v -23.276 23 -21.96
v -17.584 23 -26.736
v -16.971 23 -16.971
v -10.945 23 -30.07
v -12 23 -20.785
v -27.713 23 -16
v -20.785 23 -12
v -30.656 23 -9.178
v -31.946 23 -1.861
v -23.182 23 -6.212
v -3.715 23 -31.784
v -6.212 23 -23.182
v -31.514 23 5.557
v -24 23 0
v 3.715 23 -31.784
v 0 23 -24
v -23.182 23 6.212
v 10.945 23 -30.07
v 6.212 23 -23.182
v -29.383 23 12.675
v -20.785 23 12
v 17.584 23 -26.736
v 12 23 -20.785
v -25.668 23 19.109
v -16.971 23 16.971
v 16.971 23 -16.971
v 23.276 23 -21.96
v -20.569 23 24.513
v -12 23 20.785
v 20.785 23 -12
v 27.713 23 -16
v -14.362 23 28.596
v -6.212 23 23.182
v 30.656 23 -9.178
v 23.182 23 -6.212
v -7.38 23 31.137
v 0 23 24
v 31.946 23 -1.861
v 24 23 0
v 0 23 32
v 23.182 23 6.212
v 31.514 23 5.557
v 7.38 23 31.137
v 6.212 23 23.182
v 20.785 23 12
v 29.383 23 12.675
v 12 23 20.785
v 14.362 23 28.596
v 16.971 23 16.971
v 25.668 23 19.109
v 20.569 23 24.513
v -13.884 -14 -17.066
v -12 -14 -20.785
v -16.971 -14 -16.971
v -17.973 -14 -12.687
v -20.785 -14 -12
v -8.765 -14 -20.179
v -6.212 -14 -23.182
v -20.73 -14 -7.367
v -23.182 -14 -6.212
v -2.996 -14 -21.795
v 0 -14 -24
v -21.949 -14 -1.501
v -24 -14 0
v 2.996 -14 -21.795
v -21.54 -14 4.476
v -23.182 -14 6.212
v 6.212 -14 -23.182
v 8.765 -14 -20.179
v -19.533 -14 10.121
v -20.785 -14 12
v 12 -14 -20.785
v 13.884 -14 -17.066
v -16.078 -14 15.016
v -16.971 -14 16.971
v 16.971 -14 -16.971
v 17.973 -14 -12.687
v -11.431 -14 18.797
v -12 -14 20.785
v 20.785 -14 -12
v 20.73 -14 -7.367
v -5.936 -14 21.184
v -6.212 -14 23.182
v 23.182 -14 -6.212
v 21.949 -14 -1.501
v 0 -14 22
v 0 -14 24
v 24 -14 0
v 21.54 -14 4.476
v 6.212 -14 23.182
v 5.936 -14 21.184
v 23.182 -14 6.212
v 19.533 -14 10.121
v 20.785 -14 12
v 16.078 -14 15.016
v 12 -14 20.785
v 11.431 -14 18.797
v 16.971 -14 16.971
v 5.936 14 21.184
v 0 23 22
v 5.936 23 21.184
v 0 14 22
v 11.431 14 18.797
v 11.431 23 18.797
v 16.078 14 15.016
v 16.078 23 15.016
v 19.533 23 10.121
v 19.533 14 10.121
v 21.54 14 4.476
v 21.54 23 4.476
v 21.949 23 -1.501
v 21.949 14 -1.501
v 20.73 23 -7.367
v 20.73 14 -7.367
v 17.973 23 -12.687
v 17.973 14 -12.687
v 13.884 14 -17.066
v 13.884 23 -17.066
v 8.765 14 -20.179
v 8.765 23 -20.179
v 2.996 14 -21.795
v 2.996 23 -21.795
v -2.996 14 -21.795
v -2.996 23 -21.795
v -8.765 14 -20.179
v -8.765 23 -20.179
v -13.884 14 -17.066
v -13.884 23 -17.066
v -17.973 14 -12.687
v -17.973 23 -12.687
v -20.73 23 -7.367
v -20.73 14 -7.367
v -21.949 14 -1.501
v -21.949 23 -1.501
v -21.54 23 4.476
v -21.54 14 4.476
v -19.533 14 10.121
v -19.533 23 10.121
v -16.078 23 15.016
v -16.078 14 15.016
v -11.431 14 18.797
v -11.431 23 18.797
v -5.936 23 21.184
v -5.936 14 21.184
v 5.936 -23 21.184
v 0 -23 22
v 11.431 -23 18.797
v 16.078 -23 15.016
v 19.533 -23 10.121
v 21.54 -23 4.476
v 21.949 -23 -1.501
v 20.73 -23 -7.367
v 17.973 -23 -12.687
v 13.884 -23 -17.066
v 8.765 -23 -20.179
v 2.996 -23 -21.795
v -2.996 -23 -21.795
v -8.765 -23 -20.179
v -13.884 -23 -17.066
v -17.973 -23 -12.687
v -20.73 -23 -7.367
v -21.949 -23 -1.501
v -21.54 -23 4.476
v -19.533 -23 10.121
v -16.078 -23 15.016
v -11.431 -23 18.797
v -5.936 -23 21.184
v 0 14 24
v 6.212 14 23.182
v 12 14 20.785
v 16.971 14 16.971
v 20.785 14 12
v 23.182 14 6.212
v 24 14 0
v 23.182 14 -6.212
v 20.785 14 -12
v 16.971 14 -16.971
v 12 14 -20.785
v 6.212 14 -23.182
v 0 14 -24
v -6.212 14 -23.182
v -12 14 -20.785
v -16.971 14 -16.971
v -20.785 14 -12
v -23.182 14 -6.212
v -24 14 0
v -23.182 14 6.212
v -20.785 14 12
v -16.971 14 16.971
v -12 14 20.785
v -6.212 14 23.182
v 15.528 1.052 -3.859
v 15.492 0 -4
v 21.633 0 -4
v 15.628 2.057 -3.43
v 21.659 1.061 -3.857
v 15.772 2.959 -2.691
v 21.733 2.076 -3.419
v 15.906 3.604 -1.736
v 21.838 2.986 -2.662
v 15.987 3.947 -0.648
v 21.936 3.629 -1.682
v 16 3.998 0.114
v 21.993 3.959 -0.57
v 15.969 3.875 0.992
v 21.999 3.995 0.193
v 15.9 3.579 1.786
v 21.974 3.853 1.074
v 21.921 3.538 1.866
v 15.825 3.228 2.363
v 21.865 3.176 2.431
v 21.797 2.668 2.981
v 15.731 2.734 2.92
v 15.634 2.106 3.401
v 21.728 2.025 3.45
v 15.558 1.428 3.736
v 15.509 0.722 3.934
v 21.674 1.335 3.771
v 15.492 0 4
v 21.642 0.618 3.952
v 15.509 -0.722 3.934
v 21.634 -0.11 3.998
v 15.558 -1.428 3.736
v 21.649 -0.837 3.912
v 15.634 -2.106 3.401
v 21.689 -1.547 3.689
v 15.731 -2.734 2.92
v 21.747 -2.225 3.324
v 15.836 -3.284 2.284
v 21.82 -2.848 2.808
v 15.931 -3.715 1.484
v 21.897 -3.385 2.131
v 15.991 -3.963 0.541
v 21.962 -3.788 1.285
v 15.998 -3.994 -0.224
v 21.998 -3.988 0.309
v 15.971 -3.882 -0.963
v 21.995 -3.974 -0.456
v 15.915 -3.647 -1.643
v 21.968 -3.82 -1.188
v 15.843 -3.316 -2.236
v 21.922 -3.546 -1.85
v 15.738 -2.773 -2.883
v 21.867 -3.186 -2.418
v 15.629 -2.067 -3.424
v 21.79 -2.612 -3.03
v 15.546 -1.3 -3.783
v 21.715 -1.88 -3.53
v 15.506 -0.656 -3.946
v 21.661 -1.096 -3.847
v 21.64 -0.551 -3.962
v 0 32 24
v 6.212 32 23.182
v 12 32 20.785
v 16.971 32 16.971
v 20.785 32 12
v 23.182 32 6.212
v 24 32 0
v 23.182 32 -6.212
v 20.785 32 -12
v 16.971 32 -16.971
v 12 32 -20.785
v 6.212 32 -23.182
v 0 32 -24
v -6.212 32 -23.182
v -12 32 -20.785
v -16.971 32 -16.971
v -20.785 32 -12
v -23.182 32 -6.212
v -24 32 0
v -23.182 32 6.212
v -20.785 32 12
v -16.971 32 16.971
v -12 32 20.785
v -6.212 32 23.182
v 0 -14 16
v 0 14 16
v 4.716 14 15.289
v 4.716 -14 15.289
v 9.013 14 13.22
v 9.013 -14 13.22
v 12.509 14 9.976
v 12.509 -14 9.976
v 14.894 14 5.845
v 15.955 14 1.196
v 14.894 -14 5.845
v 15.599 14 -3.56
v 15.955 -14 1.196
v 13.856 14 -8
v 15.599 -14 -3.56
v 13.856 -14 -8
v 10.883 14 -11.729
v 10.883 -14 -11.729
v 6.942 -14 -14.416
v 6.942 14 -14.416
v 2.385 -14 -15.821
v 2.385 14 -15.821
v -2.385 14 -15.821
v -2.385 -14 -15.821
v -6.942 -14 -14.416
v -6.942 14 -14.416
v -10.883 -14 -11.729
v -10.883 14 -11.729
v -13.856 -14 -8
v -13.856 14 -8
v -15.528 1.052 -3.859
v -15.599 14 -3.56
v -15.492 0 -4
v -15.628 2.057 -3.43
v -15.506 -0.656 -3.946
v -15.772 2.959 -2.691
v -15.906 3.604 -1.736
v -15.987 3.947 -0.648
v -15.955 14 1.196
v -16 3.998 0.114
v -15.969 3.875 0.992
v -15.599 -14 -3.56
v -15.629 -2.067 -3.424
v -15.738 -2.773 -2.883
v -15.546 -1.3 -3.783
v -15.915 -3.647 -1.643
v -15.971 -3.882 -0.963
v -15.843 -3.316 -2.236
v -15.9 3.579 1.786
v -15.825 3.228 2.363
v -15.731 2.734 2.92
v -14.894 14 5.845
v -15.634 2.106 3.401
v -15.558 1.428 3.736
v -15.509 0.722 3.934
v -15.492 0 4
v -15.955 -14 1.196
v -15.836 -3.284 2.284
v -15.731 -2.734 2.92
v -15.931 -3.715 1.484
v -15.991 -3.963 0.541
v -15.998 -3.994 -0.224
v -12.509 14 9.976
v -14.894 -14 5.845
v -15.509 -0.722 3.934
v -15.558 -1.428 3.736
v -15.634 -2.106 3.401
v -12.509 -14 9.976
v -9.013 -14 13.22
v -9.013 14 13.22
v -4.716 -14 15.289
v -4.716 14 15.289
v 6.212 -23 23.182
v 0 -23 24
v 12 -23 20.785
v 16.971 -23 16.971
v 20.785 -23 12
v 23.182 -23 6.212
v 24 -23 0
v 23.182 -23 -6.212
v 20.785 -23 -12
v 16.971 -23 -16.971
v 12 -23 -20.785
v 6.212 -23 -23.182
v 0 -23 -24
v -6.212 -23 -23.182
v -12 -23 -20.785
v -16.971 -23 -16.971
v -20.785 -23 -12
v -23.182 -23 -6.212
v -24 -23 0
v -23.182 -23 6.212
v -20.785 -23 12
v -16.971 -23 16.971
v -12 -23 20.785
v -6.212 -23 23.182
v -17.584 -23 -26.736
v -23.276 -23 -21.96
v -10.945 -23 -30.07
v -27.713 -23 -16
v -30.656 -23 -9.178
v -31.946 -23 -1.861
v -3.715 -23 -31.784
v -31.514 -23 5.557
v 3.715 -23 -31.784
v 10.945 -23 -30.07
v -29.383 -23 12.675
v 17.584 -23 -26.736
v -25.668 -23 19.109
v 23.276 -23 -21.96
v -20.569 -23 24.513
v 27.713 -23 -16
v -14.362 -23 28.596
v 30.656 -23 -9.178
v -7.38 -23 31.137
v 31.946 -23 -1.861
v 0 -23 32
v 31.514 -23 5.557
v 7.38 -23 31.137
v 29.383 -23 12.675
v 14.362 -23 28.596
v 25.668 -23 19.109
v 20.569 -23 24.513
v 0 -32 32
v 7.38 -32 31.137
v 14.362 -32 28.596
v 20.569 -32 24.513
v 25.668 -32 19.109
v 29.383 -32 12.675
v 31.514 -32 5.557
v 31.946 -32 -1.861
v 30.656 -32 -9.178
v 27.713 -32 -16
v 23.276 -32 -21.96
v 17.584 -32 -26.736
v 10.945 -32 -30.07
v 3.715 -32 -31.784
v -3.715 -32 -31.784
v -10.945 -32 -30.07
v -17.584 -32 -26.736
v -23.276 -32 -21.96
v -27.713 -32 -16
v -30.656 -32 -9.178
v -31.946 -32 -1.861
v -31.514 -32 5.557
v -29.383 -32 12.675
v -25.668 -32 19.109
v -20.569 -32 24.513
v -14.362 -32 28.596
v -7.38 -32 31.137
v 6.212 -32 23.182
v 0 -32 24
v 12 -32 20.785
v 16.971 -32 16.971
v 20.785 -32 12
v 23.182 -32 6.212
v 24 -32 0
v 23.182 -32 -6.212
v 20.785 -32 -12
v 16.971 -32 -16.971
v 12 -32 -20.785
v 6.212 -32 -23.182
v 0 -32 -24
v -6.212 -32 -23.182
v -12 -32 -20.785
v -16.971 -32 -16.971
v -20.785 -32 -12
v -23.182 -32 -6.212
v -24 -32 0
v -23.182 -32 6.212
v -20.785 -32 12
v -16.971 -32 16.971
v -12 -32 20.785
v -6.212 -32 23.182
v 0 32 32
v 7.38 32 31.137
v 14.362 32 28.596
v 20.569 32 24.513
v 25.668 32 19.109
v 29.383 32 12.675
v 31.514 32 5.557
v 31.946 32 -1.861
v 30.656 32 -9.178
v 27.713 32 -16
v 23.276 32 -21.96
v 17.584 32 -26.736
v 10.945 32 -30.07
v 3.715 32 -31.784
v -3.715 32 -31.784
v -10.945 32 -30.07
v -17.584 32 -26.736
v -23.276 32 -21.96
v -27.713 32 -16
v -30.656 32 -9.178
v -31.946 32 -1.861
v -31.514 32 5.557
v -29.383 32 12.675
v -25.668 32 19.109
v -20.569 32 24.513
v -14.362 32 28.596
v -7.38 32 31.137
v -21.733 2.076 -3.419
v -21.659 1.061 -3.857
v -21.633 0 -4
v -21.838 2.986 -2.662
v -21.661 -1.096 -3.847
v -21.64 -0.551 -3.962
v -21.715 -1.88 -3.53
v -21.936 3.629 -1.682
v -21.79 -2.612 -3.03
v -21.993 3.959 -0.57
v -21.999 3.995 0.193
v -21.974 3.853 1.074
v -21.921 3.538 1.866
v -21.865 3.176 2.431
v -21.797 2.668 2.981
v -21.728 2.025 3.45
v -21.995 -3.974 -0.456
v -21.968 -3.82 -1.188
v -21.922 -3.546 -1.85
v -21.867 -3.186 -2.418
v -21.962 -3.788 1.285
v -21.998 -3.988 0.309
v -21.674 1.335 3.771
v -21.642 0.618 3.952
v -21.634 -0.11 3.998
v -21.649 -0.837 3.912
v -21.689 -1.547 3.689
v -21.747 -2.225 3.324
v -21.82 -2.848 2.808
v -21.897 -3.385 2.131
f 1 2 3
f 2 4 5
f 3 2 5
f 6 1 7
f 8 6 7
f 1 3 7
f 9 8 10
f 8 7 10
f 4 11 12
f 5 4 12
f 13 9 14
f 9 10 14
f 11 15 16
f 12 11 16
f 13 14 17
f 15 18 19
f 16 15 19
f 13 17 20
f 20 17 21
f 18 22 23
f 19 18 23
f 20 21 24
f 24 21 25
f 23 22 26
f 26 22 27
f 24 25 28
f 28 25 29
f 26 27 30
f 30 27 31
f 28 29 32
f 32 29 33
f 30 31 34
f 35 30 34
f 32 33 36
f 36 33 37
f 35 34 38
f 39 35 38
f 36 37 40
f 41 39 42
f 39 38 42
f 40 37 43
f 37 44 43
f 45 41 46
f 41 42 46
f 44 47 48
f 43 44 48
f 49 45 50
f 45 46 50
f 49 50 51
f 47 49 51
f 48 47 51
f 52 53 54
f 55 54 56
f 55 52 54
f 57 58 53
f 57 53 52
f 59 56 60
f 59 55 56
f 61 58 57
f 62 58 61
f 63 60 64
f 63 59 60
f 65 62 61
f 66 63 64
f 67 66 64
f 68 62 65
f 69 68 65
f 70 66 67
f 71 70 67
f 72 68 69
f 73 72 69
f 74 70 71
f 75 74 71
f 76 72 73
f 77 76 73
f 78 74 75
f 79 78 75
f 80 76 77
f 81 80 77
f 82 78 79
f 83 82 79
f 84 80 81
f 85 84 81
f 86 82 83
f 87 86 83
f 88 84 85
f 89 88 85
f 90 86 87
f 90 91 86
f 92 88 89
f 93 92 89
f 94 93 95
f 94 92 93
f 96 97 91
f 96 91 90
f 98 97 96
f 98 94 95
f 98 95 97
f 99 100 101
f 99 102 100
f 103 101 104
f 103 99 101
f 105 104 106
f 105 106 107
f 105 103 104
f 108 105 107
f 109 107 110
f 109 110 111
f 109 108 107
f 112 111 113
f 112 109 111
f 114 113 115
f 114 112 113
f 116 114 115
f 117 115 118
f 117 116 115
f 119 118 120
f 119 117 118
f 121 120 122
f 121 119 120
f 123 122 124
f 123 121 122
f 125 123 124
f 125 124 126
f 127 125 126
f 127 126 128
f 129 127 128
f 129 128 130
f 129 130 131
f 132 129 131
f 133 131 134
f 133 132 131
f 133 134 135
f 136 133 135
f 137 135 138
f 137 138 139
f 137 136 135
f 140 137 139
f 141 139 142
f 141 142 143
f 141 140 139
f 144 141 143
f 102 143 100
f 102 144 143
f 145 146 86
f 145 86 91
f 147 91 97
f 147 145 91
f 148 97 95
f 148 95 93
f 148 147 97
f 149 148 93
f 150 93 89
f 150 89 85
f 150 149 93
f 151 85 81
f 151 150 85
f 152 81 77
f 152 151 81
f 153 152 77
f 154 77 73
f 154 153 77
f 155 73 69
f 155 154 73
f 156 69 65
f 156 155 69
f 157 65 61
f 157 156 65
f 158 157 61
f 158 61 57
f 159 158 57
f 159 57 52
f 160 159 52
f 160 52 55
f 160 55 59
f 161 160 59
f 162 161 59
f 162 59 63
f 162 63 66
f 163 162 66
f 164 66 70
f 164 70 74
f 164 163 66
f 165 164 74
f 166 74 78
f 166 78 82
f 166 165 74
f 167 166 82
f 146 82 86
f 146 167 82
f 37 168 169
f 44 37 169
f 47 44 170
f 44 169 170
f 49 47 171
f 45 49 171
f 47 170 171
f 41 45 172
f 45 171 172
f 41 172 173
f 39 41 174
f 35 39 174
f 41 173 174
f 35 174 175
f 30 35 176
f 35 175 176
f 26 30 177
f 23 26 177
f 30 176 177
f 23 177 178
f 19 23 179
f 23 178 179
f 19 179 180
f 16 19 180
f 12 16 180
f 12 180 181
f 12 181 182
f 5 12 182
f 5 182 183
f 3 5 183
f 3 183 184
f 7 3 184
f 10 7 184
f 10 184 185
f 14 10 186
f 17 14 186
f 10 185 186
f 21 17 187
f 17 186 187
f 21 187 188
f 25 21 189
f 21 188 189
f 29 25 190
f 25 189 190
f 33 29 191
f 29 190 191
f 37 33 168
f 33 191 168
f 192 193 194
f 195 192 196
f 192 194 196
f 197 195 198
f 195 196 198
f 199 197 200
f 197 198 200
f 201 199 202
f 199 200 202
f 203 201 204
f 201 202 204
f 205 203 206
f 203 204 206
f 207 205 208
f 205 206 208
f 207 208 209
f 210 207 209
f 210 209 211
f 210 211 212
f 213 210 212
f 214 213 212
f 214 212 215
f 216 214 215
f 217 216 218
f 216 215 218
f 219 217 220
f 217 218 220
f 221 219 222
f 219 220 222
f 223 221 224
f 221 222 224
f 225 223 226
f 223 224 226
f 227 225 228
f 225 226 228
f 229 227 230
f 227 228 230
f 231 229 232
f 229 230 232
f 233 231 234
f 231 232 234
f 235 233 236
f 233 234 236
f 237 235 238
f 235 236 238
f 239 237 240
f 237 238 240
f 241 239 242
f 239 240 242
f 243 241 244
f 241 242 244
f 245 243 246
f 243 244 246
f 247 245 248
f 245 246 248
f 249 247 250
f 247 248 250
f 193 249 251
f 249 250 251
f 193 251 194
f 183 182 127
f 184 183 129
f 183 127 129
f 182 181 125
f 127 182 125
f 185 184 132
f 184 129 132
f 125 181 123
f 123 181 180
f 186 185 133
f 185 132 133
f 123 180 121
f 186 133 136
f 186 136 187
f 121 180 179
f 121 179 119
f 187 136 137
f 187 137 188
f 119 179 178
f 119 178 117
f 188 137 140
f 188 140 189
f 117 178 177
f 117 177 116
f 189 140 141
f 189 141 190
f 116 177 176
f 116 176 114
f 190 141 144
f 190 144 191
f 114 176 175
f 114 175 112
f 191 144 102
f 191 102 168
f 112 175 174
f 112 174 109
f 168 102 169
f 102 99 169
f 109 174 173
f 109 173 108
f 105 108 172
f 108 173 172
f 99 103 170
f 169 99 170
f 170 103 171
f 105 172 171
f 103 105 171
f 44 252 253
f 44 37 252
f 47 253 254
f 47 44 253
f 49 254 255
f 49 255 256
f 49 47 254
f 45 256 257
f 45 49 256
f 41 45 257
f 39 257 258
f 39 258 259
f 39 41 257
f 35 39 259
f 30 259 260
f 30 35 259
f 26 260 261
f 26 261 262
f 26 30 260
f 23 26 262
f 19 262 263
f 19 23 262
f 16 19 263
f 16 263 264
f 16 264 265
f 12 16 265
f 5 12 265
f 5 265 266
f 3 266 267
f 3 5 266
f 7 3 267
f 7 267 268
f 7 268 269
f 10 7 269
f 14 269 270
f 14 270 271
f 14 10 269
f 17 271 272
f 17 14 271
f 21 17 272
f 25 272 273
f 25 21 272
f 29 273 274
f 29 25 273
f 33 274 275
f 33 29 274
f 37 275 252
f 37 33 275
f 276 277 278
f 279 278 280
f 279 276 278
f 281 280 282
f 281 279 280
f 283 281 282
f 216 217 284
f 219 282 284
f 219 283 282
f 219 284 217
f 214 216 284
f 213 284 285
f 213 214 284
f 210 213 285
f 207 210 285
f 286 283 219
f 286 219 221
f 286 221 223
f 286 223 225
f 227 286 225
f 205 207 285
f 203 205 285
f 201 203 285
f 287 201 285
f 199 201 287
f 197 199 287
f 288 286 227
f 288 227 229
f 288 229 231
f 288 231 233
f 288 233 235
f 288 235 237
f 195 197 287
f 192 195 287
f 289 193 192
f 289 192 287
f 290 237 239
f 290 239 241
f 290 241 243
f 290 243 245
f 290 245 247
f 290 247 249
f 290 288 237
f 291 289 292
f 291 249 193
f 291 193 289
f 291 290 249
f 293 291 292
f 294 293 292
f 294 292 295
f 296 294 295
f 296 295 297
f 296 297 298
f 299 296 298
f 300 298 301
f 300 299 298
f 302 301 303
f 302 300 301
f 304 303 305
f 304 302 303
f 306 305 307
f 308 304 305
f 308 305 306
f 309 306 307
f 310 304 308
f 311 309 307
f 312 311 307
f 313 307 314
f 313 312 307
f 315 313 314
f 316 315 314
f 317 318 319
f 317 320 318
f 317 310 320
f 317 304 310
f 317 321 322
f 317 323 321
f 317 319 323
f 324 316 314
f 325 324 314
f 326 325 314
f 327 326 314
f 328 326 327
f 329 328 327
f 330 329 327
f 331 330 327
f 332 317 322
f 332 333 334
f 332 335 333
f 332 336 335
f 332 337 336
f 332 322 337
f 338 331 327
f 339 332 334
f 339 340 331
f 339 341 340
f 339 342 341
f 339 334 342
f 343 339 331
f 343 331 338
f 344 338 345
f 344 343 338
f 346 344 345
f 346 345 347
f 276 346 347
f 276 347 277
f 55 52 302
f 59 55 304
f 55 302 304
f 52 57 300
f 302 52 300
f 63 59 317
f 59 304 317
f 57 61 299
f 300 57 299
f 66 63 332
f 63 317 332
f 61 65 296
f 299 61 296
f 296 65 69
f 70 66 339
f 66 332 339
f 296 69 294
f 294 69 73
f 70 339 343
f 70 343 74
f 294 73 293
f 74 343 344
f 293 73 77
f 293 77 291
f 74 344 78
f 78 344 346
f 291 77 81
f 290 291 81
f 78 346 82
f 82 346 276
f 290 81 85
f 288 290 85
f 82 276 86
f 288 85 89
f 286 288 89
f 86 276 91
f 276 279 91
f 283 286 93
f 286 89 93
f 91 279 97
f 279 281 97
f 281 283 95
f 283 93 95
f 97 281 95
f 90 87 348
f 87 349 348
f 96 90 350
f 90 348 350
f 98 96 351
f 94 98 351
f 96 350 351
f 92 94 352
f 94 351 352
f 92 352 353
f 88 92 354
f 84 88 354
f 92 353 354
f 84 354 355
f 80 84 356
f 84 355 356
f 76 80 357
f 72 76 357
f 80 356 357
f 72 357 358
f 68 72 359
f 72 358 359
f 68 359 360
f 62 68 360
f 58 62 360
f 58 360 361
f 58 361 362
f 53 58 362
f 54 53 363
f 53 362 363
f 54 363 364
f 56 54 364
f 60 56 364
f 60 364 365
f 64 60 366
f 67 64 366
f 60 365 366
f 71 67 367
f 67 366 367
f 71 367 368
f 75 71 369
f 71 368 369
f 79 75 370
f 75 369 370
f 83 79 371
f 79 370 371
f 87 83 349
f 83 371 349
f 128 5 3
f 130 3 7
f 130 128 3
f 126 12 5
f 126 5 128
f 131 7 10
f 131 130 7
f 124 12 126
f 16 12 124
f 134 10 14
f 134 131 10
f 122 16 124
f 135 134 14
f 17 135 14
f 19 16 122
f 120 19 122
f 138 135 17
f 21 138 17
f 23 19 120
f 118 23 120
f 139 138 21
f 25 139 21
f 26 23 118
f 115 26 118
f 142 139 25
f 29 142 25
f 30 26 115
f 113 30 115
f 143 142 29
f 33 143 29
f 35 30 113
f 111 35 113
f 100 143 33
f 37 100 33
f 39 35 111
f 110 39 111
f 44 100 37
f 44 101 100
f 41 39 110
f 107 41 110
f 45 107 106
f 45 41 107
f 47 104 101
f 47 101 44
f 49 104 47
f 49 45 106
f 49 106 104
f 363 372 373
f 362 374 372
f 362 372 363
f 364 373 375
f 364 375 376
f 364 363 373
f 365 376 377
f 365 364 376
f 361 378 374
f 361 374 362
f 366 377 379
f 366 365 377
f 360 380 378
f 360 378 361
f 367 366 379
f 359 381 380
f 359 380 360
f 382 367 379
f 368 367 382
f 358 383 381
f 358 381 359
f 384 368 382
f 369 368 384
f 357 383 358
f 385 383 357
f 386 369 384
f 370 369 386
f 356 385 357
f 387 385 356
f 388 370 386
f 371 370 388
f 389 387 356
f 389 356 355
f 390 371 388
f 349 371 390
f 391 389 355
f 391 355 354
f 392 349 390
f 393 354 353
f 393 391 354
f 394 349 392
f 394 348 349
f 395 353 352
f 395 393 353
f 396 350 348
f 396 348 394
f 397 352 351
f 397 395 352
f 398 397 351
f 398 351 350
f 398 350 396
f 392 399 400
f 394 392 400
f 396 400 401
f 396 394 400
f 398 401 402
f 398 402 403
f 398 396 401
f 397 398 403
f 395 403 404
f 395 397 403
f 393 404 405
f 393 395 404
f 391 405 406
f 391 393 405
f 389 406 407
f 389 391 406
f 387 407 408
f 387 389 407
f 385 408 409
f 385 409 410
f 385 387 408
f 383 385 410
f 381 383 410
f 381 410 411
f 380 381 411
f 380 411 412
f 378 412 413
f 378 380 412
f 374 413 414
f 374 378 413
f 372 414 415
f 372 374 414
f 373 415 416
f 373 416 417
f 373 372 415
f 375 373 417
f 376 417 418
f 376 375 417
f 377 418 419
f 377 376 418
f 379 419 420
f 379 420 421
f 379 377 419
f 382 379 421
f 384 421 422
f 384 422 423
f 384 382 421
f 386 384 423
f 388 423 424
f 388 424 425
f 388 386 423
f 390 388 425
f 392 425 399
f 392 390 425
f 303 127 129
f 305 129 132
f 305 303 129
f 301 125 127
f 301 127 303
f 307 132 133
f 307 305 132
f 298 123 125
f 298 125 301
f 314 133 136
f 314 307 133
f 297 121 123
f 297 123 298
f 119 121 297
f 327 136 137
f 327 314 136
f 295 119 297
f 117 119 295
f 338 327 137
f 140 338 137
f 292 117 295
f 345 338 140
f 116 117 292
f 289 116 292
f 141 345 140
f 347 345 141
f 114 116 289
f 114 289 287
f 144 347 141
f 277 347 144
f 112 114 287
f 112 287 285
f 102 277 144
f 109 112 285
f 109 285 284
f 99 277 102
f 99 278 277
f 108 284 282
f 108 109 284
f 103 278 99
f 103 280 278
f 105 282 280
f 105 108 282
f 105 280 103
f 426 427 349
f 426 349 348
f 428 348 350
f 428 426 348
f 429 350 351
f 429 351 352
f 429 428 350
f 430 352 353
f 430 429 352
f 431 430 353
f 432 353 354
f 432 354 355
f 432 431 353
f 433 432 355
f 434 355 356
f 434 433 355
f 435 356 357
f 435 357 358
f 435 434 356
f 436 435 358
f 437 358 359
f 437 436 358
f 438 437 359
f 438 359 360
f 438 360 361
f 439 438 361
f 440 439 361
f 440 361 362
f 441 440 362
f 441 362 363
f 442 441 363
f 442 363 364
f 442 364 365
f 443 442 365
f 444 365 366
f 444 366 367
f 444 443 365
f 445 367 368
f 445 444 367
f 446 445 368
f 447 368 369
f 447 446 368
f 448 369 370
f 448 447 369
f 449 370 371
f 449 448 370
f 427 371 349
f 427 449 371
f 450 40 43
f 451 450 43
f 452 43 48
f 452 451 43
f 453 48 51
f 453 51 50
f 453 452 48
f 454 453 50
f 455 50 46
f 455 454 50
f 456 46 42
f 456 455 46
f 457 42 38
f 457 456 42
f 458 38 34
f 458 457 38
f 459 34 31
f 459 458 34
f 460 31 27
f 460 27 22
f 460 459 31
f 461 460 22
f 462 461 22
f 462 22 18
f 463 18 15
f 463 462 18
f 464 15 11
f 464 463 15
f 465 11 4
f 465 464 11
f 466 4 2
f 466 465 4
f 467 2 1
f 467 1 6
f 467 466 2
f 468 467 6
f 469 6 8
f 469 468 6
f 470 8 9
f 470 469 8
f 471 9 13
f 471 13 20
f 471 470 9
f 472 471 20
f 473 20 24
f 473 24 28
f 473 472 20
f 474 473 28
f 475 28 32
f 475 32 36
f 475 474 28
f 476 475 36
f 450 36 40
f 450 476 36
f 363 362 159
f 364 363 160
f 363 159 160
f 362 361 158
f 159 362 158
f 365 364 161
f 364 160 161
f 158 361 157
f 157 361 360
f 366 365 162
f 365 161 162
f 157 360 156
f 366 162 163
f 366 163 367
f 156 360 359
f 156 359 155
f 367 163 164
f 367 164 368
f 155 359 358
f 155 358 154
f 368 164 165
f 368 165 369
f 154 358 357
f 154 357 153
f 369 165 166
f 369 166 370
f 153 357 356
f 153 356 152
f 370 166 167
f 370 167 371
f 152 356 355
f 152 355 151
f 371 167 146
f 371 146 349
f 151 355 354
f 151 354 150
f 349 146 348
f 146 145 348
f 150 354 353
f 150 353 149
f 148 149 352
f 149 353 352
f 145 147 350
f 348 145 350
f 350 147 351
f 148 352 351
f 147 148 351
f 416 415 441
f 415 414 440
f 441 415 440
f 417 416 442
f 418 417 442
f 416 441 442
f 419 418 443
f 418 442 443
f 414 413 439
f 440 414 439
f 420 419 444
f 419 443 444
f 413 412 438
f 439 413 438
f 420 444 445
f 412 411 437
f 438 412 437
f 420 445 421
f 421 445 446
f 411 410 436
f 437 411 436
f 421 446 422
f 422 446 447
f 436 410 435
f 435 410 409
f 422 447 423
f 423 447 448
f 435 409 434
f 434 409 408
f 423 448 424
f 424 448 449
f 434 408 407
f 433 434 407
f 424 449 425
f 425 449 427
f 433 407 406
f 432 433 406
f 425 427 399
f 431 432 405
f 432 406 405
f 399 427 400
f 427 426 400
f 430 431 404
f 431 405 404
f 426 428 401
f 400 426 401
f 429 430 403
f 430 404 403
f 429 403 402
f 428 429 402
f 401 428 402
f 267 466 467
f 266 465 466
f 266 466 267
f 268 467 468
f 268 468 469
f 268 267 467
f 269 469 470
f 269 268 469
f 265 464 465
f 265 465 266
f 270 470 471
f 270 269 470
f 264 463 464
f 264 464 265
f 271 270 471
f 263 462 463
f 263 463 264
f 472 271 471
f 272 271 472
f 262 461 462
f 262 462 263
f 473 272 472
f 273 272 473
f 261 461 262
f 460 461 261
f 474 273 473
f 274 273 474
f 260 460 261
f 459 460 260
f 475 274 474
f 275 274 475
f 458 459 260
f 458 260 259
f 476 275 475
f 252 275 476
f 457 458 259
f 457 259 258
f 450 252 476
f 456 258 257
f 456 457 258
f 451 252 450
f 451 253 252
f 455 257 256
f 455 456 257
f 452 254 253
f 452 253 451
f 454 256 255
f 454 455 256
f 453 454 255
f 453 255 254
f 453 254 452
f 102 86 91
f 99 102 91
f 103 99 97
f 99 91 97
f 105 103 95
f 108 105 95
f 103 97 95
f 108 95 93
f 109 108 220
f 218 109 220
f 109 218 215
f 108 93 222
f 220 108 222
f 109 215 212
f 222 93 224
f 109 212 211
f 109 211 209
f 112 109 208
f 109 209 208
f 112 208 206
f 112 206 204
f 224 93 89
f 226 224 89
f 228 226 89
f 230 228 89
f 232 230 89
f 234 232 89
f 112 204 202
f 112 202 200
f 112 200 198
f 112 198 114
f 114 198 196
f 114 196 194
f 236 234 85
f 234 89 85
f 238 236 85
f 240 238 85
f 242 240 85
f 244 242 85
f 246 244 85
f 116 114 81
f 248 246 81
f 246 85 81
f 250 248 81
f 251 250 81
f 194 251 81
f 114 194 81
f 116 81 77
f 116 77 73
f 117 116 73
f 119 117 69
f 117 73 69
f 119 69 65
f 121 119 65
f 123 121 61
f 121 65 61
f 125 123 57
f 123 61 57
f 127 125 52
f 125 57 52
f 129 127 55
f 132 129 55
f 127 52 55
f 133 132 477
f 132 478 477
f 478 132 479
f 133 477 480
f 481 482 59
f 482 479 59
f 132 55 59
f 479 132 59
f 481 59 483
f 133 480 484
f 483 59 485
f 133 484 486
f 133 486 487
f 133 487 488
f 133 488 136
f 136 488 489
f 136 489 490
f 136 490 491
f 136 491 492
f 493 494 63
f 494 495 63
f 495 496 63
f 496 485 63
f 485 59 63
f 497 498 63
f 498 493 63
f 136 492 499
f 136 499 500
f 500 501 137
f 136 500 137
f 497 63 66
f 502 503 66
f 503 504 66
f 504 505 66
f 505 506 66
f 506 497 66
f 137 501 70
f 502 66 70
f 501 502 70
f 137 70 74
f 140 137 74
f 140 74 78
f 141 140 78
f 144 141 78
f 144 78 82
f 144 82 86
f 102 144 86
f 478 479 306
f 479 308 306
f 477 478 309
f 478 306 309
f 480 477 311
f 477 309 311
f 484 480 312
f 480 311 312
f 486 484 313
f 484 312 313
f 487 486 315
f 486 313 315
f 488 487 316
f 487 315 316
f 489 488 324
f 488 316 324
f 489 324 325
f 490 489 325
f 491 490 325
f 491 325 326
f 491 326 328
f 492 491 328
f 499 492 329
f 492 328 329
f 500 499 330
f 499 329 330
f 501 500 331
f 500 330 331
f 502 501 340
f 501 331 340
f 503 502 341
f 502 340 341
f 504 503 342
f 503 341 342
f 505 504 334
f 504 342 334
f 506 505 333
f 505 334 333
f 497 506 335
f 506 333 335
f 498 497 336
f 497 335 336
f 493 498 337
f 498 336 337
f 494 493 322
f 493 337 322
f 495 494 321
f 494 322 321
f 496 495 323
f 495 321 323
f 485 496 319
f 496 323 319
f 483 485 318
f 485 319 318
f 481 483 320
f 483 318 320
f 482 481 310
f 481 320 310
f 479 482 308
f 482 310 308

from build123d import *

# Parameters (mm, degrees)
SKETCH1_R           = 22
SKETCH1_R_2         = 16
BOSS_EXTRUDE1_DEPTH = 14
SKETCH1_5_R         = 24
SKETCH1_5_R_2       = 22
BOSS_EXTRUDE3_DEPTH = 23
SKETCH1_6_R         = 32
SKETCH1_6_R_2       = 24
BOSS_EXTRUDE4_DEPTH = 32
SKETCH1_7_R         = 24
SKETCH1_7_R_2       = 22
CUT_EXTRUDE1_DEPTH  = 14
SKETCH1_8_R         = 32
SKETCH1_8_R_2       = 24
CUT_EXTRUDE2_DEPTH  = 23
SKETCH2_R           = 4
CUT_EXTRUDE3_DEPTH  = 23


with BuildPart() as part:
    # Sketch1 → Boss-Extrude1 (new, symmetric)
    with BuildSketch(Plane(origin=(0, 0, 0), x_dir=(1, 0, 0), z_dir=(0, 1, 0))):
        Circle(SKETCH1_R)
        Circle(SKETCH1_R_2, mode=Mode.SUBTRACT)
    extrude(amount=BOSS_EXTRUDE1_DEPTH, both=True)

    # Sketch1<5> → Boss-Extrude3 (add, symmetric)
    with BuildSketch(Plane(origin=(0, 0, 0), x_dir=(1, 0, 0), z_dir=(0, 1, 0))):
        Circle(SKETCH1_5_R)
        Circle(SKETCH1_5_R_2, mode=Mode.SUBTRACT)
    extrude(amount=BOSS_EXTRUDE3_DEPTH, both=True)

    # Sketch1<6> → Boss-Extrude4 (add, symmetric)
    with BuildSketch(Plane(origin=(0, 0, 0), x_dir=(1, 0, 0), z_dir=(0, 1, 0))):
        Circle(SKETCH1_6_R)
        Circle(SKETCH1_6_R_2, mode=Mode.SUBTRACT)
    extrude(amount=BOSS_EXTRUDE4_DEPTH, both=True)

    # Sketch1<7> → Cut-Extrude1 (cut, symmetric)
    with BuildSketch(Plane(origin=(0, 0, 0), x_dir=(1, 0, 0), z_dir=(0, 1, 0))):
        Circle(SKETCH1_7_R)
        Circle(SKETCH1_7_R_2, mode=Mode.SUBTRACT)
    extrude(amount=CUT_EXTRUDE1_DEPTH, both=True, mode=Mode.SUBTRACT)


with BuildPart() as cut_extrude1_piece_1:
    # of the separate pieces the step leaves, piece 1, a body of its own (cut_extrude1_pieces)
    add(part.part.solids().sort_by_distance((32, -32, 0))[0])

    # Sketch1<8> → Cut-Extrude2 (cut, symmetric)
    with BuildSketch(Plane(origin=(0, 0, 0), x_dir=(1, 0, 0), z_dir=(0, 1, 0))):
        Circle(SKETCH1_8_R)
        Circle(SKETCH1_8_R_2, mode=Mode.SUBTRACT)
    extrude(amount=CUT_EXTRUDE2_DEPTH, both=True, mode=Mode.SUBTRACT)


with BuildPart() as cut_extrude1_piece_2:
    # of the separate pieces the step leaves, piece 2, a body of its own (cut_extrude1_pieces)
    add(part.part.solids().sort_by_distance((16, -14, 0))[0])

    # Sketch2 → Cut-Extrude3 (cut, symmetric)
    with BuildSketch(Plane(origin=(0, 0, 0), x_dir=(0, 0, -1), z_dir=(1, 0, 0))):
        Circle(SKETCH2_R)
    extrude(amount=CUT_EXTRUDE3_DEPTH, both=True, mode=Mode.SUBTRACT)


with BuildPart() as cut_extrude2_piece_1:
    # of the separate pieces the step leaves, piece 1, a body of its own (cut_extrude2_pieces)
    add(cut_extrude1_piece_1.part.solids().sort_by_distance((32, -32, 0))[0])


with BuildPart() as cut_extrude2_piece_2:
    # of the separate pieces the step leaves, piece 2, a body of its own (cut_extrude2_pieces)
    add(cut_extrude1_piece_1.part.solids().sort_by_distance((32, 23, 0))[0])


with BuildPart() as cut_extrude2_piece_3:
    # of the separate pieces the step leaves, piece 3, a body of its own (cut_extrude2_pieces)
    add(cut_extrude1_piece_1.part.solids().sort_by_distance((22, -23, 0))[0])


with BuildPart() as cut_extrude2_piece_4:
    # of the separate pieces the step leaves, piece 4, a body of its own (cut_extrude2_pieces)
    add(cut_extrude1_piece_1.part.solids().sort_by_distance((22, 23, 0))[0])


solid = Compound([cut_extrude1_piece_2.part, cut_extrude2_piece_1.part, cut_extrude2_piece_2.part, cut_extrude2_piece_3.part, cut_extrude2_piece_4.part])
